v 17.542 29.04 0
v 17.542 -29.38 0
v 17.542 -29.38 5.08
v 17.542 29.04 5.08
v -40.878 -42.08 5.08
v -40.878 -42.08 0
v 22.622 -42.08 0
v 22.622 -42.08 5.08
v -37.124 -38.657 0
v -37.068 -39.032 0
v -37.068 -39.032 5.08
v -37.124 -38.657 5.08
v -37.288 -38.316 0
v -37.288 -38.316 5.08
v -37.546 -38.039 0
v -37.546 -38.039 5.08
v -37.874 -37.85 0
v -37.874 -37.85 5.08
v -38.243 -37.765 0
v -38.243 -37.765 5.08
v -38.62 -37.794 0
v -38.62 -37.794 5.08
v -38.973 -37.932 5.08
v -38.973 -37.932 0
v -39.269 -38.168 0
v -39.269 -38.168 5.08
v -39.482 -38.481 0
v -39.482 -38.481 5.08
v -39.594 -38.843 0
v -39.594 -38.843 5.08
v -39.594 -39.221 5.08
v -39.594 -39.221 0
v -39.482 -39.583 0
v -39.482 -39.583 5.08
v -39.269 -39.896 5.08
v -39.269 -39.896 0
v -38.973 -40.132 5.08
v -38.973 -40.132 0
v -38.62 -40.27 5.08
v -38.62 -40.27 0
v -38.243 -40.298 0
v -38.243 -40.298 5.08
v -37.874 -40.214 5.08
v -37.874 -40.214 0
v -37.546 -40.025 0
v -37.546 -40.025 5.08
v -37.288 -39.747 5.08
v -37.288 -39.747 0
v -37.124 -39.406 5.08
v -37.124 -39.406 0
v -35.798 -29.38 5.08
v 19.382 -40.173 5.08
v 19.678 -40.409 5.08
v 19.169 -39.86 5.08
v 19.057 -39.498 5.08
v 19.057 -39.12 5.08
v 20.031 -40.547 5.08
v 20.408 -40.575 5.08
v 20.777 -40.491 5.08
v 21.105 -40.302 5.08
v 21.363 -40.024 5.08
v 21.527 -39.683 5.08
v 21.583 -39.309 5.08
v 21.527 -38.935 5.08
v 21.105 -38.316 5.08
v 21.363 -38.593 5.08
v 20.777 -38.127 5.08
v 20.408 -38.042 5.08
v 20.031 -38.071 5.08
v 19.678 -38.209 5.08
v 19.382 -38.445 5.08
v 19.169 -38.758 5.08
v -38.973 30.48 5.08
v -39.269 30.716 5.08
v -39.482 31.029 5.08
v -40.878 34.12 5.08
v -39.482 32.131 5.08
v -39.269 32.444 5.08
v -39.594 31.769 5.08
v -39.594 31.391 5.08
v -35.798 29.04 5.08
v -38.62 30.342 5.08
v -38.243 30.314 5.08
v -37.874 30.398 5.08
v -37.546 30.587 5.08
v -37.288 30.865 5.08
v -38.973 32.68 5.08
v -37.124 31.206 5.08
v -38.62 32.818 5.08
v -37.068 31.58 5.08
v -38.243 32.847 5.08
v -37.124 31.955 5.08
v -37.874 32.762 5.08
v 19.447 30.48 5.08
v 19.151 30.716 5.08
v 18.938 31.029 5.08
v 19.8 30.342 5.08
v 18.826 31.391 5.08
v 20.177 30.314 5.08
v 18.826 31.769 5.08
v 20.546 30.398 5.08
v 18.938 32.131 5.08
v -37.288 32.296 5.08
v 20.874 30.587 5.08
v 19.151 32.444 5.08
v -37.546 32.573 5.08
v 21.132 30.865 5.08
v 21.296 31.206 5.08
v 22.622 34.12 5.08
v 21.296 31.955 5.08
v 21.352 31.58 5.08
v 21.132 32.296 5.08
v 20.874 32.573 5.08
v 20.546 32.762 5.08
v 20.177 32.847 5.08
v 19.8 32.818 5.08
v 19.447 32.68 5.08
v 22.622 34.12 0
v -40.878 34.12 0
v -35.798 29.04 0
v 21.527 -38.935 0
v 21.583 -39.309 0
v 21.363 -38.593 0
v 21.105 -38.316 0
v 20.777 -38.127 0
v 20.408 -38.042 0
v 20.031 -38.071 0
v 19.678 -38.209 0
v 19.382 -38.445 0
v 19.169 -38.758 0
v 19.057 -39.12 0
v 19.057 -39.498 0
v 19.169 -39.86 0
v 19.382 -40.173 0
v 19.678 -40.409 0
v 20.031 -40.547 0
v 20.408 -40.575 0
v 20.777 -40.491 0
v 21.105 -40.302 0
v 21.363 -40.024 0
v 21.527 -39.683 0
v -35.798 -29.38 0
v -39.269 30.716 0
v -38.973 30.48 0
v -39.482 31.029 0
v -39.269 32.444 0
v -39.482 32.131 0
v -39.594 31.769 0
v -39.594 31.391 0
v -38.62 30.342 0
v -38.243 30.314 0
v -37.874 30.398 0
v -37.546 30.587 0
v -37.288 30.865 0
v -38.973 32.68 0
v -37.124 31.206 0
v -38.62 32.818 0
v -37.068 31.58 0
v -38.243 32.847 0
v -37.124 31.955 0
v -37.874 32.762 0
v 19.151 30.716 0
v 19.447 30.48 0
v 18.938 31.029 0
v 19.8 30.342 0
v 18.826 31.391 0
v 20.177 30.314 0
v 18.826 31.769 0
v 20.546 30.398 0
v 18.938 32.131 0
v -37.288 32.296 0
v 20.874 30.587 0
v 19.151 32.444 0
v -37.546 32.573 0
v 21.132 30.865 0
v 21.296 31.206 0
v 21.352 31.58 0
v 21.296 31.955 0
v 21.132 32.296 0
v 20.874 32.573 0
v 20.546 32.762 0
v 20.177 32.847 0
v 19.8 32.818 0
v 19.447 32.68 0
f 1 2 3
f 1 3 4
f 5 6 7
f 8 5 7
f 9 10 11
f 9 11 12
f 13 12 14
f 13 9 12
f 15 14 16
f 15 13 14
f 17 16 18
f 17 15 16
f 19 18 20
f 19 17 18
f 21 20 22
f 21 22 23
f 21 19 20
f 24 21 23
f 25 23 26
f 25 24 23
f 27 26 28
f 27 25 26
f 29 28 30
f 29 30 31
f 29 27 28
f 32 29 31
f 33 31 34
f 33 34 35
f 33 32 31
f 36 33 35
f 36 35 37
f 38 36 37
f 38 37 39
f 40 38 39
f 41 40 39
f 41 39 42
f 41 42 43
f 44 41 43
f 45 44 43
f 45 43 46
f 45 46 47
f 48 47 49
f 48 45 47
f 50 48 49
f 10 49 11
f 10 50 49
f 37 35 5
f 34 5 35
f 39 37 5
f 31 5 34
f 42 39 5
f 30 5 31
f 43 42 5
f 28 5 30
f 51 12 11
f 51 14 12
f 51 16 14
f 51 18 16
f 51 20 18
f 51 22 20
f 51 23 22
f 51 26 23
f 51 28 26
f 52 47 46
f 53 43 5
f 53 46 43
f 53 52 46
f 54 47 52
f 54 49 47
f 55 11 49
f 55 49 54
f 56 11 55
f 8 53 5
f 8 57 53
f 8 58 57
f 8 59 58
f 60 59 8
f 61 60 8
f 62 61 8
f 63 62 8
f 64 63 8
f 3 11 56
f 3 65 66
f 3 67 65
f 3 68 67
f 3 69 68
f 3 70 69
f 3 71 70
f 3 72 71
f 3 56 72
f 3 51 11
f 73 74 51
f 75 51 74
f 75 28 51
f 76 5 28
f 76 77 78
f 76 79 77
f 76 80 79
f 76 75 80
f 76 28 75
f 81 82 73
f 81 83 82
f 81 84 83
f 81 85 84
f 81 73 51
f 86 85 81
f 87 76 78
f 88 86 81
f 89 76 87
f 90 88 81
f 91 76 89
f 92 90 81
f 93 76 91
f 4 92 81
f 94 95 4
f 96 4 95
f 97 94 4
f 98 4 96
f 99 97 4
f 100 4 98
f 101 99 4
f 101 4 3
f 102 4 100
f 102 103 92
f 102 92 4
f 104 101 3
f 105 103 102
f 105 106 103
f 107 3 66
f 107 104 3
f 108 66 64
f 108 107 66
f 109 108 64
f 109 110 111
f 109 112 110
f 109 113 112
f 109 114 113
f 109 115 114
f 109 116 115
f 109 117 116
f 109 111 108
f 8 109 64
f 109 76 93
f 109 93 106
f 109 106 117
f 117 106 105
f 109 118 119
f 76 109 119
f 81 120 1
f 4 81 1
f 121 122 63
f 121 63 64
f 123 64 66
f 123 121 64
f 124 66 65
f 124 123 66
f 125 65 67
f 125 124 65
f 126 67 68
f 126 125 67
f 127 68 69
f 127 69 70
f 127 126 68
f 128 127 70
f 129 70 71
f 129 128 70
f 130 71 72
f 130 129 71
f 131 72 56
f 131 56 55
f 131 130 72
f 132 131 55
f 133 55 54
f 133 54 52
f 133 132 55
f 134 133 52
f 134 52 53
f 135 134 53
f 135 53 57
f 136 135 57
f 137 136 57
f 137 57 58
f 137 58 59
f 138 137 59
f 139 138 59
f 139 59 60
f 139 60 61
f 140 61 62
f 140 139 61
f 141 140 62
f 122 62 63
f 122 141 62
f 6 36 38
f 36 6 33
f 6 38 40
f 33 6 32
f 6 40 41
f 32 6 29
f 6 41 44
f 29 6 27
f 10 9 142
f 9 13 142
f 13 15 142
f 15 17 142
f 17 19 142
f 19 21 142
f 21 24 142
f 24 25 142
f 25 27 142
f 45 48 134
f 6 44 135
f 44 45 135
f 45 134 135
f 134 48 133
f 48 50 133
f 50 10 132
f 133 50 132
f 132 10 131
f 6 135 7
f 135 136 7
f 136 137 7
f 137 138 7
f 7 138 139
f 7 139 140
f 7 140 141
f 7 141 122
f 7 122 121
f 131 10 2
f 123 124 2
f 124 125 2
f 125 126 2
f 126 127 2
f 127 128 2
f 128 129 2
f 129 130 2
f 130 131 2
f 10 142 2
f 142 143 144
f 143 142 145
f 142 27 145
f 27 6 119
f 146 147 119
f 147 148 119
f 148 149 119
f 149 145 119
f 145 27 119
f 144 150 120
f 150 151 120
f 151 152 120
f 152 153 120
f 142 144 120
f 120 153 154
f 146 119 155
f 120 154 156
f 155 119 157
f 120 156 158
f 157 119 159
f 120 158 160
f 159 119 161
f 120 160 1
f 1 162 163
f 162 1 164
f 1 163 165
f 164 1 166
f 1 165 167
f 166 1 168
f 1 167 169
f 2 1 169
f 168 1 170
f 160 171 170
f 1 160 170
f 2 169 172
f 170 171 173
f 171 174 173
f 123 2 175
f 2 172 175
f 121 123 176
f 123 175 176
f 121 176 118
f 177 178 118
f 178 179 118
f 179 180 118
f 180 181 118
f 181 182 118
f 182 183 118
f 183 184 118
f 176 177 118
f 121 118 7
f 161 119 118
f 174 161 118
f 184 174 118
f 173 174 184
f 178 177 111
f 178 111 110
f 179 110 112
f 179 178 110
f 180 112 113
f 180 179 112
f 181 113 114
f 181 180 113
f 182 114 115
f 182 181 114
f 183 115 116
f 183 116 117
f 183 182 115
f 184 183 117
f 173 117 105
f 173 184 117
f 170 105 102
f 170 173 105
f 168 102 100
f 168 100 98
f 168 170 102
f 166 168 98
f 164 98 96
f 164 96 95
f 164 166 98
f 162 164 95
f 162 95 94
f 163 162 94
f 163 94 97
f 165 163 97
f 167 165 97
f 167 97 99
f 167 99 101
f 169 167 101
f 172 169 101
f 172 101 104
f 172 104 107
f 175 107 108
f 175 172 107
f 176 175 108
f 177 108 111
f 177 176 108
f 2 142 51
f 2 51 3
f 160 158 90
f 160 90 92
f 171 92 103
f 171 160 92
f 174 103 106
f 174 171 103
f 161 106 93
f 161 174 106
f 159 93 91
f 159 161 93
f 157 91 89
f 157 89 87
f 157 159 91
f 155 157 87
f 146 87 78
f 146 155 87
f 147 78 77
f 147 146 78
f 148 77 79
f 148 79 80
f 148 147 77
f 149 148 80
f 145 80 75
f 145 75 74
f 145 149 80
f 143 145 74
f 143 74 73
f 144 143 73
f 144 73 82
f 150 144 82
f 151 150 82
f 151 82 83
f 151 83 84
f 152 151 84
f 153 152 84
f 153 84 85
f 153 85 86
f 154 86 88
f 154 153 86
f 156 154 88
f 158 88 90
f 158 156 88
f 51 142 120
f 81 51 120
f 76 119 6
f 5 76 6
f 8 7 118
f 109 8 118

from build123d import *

# Parameters (mm, degrees)
F0_W     = 5.08
F0_H     = 5.08
F0_R     = 1.27
F0_W_2   = 53.340002
F0_H_2   = 58.42
F0_W_3   = 5.079998
F0_H_3   = 12.7
F1_DEPTH = 5.08


with BuildPart() as f1:
    # F0 (on Top) → F1 (new body)
    with BuildSketch(Plane.XY):
        with Locations((-38.3377, 31.580215)):
            Rectangle(F0_W, F0_H)
        with Locations((-38.3377, 31.580215)):
            Circle(F0_R, mode=Mode.SUBTRACT)
        with Locations((-9.127699, 31.580215)):
            Rectangle(F0_W_2, F0_H)
        with Locations((-38.3377, -0.169785)):
            Rectangle(F0_W, F0_H_2)
        with Locations((20.082301, 31.580215)):
            Rectangle(F0_W_3, F0_H)
        with Locations((20.082301, 31.580215)):
            Circle(F0_R, mode=Mode.SUBTRACT)
        with Locations((-38.3377, -35.729785)):
            Rectangle(F0_W, F0_H_3)
        with Locations((-38.3377, -39.031785)):
            Circle(F0_R, mode=Mode.SUBTRACT)
        with Locations((20.082301, -0.169785)):
            Rectangle(F0_W_3, F0_H_2)
        with Locations((-9.127699, -35.729785)):
            Rectangle(F0_W_2, F0_H_3)
        with Locations((20.082301, -35.729785)):
            Rectangle(F0_W_3, F0_H_3)
        with Locations((20.313209, -39.308877)):
            Circle(F0_R, mode=Mode.SUBTRACT)
    extrude(amount=F1_DEPTH)


solid = f1.part
